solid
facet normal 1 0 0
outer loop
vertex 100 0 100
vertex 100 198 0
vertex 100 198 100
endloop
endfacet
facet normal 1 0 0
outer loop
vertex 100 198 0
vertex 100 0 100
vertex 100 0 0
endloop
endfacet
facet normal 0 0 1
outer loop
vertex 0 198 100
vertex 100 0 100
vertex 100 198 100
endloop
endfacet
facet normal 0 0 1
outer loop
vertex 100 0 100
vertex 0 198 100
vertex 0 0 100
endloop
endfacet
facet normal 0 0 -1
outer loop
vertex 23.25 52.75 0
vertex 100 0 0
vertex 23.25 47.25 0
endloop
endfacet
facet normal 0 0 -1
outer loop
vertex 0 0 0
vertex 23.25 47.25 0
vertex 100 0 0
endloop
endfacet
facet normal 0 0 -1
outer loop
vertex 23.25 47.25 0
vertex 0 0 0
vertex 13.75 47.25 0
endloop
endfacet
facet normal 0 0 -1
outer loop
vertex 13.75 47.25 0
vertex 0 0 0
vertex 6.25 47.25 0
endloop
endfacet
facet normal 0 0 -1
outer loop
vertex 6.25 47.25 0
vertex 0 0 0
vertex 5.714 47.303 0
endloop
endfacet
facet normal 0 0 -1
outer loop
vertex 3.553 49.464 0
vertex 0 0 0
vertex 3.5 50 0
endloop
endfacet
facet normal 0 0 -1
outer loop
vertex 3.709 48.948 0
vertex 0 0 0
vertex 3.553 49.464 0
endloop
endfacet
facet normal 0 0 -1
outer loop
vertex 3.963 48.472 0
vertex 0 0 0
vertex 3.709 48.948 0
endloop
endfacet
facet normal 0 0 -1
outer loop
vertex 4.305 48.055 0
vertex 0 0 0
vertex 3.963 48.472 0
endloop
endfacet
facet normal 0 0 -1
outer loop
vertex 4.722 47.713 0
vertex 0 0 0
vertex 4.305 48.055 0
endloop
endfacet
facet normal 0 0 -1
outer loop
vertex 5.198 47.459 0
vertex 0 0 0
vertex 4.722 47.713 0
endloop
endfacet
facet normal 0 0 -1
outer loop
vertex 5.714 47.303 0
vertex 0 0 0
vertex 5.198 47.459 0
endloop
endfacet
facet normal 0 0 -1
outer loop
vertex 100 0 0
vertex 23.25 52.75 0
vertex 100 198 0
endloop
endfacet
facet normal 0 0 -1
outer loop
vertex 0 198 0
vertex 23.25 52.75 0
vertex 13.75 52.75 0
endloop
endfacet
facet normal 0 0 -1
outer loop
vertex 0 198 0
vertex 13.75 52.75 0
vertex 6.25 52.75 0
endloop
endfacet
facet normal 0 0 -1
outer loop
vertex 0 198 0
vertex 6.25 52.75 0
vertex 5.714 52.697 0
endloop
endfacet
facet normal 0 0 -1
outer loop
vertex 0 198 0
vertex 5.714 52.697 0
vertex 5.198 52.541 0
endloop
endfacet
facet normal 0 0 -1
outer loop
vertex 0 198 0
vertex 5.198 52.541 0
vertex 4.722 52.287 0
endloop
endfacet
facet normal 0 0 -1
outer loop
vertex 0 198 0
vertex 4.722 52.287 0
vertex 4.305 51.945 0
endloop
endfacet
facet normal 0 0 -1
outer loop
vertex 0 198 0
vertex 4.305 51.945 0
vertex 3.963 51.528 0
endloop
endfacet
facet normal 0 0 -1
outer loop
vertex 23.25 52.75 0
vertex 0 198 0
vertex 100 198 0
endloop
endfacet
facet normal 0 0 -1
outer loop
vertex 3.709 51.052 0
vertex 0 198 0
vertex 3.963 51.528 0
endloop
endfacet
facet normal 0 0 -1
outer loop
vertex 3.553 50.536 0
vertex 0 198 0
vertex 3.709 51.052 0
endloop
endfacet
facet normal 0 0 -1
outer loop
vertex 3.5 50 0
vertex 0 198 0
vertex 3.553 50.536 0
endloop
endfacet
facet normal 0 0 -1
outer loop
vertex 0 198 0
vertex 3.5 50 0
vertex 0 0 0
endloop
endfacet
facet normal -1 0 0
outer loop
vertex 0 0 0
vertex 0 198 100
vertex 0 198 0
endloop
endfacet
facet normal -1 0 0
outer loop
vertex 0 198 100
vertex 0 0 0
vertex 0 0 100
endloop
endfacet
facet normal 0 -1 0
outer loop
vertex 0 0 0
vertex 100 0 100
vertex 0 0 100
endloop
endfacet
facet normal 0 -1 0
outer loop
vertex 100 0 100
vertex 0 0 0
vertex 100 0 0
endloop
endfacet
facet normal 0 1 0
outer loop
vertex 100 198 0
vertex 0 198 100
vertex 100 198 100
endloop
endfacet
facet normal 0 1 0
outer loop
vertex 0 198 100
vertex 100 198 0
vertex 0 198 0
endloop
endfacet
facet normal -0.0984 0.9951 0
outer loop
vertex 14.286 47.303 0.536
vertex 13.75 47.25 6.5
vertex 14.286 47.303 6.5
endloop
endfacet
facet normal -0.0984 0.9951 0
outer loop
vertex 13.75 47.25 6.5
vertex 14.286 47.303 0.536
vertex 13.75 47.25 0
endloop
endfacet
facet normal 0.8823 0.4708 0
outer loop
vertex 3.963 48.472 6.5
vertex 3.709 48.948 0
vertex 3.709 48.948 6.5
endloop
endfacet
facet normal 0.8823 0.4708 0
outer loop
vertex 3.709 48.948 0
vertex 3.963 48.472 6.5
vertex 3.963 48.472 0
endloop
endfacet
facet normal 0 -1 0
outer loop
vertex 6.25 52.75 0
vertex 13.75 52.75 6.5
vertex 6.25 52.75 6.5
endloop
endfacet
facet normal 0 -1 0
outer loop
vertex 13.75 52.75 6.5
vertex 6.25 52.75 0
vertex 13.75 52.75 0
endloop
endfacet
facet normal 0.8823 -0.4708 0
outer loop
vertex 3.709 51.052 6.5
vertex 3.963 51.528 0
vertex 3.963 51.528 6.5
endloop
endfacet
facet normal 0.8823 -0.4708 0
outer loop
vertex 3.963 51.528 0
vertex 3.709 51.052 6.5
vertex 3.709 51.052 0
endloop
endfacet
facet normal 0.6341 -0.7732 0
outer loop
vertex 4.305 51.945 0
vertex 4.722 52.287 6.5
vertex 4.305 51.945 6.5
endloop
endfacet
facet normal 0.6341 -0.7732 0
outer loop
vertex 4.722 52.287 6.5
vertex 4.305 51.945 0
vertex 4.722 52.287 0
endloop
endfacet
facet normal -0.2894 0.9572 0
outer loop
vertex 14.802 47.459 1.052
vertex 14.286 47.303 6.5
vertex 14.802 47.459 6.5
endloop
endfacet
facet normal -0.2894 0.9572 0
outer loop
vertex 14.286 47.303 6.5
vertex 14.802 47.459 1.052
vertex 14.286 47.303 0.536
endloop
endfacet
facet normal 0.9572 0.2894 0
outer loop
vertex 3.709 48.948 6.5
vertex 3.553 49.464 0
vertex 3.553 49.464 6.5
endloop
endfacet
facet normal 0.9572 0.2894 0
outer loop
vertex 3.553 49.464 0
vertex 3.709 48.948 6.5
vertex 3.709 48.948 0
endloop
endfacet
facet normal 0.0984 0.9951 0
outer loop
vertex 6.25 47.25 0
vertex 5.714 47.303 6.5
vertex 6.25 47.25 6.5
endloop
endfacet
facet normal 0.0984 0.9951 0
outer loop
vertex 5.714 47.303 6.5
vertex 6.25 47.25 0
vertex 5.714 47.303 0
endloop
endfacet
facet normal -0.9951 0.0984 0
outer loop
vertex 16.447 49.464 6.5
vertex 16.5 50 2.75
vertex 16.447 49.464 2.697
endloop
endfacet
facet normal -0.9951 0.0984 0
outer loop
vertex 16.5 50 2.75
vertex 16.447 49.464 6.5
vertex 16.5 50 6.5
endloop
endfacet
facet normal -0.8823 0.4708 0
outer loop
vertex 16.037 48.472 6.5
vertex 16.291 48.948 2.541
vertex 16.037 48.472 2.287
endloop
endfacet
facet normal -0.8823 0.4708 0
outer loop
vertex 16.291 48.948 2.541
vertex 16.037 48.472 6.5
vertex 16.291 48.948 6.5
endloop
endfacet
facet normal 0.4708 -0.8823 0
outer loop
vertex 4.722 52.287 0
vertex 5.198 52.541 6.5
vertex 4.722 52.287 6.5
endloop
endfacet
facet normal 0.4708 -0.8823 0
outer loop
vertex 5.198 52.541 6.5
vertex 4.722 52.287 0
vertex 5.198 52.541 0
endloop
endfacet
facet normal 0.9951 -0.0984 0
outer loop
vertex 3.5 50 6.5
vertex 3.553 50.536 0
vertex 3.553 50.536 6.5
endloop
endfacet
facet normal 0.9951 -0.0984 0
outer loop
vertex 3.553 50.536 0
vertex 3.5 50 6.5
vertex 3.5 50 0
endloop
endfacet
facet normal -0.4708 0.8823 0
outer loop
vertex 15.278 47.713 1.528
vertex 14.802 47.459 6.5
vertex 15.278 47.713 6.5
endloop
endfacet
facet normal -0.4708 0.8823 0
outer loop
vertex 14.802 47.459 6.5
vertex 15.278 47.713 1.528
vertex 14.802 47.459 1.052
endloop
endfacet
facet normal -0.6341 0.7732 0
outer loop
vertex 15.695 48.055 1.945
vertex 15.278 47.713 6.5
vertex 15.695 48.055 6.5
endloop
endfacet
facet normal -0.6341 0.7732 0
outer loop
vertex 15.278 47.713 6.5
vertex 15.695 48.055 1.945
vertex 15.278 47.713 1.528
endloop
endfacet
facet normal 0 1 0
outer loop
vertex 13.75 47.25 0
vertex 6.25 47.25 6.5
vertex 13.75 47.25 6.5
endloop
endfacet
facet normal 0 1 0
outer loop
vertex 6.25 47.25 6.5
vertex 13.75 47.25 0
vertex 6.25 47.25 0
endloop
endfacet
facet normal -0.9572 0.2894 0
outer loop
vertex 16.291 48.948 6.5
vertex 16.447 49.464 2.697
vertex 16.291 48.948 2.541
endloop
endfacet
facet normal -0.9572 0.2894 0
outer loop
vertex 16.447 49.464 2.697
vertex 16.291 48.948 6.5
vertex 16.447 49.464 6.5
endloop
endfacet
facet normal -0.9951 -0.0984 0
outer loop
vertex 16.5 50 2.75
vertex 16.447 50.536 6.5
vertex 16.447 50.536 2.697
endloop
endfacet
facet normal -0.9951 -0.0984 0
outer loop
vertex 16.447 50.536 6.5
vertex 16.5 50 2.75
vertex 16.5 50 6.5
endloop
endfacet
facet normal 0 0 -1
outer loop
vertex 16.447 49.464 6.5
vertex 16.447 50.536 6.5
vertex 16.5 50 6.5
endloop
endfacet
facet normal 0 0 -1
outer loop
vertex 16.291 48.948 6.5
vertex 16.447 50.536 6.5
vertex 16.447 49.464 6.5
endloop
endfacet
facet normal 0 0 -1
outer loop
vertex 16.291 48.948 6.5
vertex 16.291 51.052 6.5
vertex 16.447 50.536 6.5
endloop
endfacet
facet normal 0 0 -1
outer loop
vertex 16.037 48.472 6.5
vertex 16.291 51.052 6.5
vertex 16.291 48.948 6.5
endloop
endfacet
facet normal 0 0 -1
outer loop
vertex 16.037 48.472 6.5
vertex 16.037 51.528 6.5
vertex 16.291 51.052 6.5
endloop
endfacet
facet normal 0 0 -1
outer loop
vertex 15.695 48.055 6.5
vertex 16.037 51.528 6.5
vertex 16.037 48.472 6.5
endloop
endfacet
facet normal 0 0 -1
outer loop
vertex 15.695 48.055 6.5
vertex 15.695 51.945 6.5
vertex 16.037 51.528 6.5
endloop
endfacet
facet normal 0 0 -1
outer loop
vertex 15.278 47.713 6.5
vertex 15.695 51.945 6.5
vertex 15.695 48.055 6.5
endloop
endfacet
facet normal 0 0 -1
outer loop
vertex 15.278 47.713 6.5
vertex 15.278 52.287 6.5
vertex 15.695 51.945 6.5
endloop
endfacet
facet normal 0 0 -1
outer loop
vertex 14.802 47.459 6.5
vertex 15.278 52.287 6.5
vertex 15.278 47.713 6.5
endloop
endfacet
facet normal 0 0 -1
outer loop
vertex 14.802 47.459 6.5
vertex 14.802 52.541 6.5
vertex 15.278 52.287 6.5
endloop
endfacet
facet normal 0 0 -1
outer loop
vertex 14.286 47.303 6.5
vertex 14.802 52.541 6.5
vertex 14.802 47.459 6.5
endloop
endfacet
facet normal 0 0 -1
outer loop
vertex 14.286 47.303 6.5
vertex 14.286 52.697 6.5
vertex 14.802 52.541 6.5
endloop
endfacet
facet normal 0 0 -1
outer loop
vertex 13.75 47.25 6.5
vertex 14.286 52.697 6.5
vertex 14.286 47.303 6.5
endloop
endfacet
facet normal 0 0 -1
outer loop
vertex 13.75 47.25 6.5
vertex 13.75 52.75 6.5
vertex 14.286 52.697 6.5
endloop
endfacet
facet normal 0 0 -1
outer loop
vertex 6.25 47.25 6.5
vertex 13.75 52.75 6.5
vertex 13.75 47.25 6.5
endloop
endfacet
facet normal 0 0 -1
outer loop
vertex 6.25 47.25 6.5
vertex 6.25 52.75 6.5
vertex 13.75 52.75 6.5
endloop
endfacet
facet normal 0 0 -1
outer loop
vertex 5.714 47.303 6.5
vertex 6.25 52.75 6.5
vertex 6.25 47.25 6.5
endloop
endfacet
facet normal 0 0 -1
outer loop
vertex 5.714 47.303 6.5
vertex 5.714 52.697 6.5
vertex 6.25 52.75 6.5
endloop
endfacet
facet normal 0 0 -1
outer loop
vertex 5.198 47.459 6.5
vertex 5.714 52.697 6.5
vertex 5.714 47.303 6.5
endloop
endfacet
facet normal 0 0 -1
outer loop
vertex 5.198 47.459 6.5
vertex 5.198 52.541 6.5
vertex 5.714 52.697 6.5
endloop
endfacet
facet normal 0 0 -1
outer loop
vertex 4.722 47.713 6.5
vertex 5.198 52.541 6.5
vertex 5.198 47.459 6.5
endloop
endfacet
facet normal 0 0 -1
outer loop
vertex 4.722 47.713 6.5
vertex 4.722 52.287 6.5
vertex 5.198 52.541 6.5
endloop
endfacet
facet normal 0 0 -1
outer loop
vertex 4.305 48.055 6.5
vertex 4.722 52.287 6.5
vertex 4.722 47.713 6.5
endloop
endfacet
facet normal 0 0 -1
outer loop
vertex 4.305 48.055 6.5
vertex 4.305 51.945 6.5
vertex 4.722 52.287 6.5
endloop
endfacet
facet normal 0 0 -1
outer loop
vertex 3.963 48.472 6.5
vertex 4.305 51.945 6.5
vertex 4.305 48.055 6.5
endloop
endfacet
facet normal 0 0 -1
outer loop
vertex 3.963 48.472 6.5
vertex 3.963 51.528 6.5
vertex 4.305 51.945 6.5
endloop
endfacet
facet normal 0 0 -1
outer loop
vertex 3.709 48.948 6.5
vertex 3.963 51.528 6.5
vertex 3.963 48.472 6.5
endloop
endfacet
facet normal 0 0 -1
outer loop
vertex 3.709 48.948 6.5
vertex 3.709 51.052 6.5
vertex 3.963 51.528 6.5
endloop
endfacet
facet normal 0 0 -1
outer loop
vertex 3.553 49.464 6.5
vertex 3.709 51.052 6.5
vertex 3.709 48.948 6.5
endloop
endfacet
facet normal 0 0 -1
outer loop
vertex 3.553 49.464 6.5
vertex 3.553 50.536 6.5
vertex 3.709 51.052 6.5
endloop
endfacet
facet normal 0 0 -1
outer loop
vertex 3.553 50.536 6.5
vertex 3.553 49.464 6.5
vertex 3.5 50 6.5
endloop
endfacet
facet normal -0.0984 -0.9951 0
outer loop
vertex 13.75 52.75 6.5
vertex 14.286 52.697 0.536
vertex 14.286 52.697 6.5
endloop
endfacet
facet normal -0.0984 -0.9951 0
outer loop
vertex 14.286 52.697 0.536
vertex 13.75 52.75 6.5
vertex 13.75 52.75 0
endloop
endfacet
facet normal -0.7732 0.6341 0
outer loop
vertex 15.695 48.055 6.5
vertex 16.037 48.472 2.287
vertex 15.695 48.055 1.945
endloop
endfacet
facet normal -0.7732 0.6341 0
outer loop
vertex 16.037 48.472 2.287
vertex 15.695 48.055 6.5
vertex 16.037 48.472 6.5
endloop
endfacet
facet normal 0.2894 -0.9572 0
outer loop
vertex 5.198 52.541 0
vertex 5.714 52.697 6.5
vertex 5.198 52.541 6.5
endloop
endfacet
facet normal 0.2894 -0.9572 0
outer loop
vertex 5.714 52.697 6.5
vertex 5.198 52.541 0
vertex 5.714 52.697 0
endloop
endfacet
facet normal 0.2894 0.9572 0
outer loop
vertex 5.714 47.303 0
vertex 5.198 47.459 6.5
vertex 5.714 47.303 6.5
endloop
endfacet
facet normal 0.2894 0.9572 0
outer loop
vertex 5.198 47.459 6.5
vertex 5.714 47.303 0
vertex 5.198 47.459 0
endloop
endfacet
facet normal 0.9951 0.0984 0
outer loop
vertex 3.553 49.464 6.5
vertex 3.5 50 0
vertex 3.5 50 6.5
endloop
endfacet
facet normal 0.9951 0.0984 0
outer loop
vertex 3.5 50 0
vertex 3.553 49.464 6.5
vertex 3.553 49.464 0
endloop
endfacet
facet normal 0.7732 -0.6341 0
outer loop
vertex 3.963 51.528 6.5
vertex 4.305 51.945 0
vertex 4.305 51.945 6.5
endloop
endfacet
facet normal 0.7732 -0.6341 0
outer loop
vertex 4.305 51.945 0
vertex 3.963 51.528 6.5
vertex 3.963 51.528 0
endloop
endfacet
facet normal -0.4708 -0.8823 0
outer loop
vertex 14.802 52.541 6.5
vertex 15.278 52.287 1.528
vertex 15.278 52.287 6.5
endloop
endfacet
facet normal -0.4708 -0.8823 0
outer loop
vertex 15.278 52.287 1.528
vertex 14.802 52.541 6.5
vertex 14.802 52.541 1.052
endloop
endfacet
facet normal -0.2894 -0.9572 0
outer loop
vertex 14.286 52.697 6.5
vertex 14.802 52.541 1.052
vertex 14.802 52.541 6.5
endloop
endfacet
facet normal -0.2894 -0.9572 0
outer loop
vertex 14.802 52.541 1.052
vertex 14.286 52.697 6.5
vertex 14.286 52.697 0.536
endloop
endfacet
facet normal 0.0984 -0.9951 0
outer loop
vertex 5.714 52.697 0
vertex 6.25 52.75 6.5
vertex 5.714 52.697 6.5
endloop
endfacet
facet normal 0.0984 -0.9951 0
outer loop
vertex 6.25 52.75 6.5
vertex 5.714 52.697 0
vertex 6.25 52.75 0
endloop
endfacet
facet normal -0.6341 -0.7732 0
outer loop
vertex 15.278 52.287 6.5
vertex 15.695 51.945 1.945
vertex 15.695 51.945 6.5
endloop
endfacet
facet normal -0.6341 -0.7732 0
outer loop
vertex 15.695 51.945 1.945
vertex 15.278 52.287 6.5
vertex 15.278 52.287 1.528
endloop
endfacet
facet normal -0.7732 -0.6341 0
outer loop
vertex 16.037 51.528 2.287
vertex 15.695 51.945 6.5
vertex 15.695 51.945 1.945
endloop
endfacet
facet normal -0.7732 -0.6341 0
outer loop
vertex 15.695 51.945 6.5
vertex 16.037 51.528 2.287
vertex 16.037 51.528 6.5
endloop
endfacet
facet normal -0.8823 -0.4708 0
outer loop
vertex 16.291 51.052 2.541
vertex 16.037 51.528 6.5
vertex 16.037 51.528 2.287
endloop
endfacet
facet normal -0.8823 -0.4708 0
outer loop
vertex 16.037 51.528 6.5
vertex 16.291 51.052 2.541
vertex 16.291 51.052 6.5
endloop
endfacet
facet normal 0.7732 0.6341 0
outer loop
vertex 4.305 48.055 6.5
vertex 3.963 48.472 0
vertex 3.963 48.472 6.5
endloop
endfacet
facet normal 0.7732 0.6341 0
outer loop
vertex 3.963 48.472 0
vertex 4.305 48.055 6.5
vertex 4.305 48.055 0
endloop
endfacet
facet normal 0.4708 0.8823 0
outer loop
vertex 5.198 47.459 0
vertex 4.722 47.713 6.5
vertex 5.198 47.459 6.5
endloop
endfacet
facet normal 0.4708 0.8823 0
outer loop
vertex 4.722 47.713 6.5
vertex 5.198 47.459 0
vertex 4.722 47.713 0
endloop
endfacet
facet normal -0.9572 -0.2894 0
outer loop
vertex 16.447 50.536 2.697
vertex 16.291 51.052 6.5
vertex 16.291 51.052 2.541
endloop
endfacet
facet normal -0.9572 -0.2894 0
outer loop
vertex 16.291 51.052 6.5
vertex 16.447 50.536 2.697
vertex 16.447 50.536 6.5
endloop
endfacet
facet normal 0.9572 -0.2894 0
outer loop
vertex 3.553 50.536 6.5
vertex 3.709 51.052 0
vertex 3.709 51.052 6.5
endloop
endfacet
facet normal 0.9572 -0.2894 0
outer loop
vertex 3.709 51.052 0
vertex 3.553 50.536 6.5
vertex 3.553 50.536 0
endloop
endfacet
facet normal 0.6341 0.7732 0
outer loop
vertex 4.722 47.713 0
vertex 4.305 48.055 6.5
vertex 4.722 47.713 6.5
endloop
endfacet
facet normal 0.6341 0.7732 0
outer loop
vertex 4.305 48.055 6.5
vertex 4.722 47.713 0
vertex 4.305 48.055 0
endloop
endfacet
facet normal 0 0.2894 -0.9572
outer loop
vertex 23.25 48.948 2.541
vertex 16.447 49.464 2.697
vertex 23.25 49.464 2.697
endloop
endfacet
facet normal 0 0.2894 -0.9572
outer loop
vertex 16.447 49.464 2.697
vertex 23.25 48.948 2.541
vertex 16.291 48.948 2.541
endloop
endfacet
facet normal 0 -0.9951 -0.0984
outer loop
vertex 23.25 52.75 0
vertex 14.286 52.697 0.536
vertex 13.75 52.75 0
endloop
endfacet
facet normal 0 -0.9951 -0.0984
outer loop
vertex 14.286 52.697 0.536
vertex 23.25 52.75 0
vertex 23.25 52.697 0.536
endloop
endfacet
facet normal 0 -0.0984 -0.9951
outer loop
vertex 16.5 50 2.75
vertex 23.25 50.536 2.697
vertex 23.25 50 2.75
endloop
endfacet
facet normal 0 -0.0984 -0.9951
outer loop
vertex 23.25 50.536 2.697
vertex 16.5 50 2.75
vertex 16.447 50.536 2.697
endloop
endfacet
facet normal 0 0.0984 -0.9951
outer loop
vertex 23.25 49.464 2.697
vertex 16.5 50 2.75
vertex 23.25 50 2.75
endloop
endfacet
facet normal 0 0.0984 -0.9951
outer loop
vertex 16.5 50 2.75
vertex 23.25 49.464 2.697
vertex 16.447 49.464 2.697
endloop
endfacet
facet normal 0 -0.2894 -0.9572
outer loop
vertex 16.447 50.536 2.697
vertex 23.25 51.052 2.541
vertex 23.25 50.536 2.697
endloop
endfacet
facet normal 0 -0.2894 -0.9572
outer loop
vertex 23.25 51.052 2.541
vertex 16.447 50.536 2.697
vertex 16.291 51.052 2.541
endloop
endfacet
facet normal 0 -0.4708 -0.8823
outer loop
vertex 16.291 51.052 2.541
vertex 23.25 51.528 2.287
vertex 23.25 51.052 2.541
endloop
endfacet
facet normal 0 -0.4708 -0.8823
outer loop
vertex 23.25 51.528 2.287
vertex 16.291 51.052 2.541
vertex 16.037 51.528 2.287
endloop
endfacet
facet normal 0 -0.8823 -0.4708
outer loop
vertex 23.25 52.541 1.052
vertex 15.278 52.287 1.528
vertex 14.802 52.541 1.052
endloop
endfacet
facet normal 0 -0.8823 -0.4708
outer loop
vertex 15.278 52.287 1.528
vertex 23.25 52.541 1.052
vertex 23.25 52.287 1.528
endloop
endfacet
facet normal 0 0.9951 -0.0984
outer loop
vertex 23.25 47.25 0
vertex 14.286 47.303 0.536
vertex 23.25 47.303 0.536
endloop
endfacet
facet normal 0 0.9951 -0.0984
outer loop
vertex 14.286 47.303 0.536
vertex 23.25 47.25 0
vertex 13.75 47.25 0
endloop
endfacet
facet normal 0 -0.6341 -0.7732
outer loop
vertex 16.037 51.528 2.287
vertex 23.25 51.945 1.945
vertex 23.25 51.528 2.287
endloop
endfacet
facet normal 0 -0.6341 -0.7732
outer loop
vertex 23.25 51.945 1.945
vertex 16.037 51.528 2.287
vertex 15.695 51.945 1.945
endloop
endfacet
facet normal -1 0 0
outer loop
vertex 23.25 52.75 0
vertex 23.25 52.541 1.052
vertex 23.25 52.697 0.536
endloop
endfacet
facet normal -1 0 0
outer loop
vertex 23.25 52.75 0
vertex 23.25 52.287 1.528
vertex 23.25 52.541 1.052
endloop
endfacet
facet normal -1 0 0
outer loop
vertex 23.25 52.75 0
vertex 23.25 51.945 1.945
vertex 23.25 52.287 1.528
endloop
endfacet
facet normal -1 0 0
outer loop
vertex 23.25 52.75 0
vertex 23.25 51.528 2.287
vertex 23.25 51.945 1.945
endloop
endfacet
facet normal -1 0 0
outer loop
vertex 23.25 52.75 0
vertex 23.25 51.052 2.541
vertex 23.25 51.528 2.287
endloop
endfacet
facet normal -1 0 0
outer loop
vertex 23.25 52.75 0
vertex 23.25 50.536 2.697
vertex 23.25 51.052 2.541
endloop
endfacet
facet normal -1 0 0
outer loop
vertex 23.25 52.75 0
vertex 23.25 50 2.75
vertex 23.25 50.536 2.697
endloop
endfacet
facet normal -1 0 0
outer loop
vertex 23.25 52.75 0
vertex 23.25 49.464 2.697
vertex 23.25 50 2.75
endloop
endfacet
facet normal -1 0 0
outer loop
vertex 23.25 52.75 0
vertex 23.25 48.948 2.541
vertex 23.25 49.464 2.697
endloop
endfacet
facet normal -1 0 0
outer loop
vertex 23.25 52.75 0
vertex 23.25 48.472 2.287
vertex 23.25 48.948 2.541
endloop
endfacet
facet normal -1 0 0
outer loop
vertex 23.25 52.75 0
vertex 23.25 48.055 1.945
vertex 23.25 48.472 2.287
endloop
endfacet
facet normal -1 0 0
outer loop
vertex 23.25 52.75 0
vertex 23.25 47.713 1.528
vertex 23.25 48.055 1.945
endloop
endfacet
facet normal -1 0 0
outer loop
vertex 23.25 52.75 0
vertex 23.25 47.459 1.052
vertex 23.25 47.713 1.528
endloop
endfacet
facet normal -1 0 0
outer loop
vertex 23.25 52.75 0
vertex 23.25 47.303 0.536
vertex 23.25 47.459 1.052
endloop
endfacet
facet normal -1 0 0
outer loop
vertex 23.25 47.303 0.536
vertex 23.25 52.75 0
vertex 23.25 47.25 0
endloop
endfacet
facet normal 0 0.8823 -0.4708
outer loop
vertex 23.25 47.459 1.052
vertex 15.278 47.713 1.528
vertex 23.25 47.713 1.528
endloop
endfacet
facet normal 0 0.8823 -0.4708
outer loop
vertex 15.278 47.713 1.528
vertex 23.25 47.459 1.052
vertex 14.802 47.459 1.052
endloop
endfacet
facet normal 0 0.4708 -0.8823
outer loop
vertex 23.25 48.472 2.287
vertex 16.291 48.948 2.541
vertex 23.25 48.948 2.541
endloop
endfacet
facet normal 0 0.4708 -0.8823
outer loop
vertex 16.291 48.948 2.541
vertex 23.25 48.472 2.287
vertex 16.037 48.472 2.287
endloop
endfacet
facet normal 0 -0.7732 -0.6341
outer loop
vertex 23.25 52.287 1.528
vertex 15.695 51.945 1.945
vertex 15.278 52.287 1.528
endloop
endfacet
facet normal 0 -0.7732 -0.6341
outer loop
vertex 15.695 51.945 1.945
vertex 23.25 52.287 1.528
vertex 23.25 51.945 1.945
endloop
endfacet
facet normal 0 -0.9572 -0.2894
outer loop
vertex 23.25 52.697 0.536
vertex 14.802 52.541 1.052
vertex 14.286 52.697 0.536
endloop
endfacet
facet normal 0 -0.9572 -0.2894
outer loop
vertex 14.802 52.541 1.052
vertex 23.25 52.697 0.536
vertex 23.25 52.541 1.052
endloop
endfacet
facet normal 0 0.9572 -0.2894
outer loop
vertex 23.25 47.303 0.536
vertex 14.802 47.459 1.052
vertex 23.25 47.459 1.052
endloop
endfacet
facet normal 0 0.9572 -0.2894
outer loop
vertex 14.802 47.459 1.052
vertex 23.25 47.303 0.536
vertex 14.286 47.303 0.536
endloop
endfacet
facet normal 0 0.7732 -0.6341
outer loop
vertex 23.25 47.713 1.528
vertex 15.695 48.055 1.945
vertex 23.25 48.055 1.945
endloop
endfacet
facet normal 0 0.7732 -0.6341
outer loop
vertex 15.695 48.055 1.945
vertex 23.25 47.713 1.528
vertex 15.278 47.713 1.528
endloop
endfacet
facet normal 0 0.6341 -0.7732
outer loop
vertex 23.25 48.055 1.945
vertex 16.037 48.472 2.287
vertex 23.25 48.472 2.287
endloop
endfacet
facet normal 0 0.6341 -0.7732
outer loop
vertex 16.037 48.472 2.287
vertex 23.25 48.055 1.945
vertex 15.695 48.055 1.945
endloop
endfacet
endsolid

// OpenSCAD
$fn = 32;
// ----------------------------------------------------------------------
// Freeform bracket: 100 x 100 x 100 mm
// ----------------------------------------------------------------------
// --- parameters (mm) ---
base_len = 100;           // outer length, X
upright_h = 100;          // upright height, Z
flange_w = 100;           // outer width, Y
flange_t = 4;             // flange thickness
mat_t = 3;                // tube thickness
hole_d = 5.5;             // clearance for M5
slot_w = 5.5;             // euro screw slot width
slot_l = 13;              // euro screw slot length
rib_leg = 45;             // gusset leg
rib_sink = 1.6;           // gusset overlap into the uprights
module hole_z(px, py) {
  translate([px, py, -2.5]) cylinder(h = flange_t + 5, d = hole_d);
}
module hole_x(pz, py) {
  translate([-2.5, py, pz]) rotate([0, 90, 0]) cylinder(h = flange_t + 5, d = hole_d);
}
module euro_slot_z(px, py) {
  hull() {
    translate([px - (slot_l - slot_w) / 2, py, -2.5]) cylinder(h = flange_t + 5, d = slot_w);
    translate([px + (slot_l - slot_w) / 2, py, -2.5]) cylinder(h = flange_t + 5, d = slot_w);
  }
}
module euro_slot_x(pz, py) {
  translate([-2.5, 0, 0]) rotate([0, 90, 0]) hull() {
    translate([0, py, pz - (slot_l - slot_w) / 2]) cylinder(h = flange_t + 5, d = slot_w);
    translate([0, py, pz + (slot_l - slot_w) / 2]) cylinder(h = flange_t + 5, d = slot_w);
  }
}
module gusset() {
  translate([0, flange_w - rib_sink, 0])
    rotate([90, 0, 0])
      linear_extrude(height = flange_w - 2 * rib_sink)
        polygon(points = [[rib_sink, rib_sink], [rib_leg, rib_sink], [rib_sink, rib_leg]]);
}
module base() {
  cube([base_len, flange_w, flange_t]);
}
module uprights() {
  cube([base_len, flange_w, upright_h]);
  translate([0, flange_w - 1, 0]) cube([base_len, flange_w - 1, upright_h]);
}
module gusset_hull() {
  translate([0, flange_w - 1, 0])
    cube([base_len, flange_w - 1, upright_h - 1]);
}
difference() {
  union() {
    base();
    uprights();
    gusset();
  }
  euro_slot_z(10, 50);
  euro_slot_x(13, 50);
}
